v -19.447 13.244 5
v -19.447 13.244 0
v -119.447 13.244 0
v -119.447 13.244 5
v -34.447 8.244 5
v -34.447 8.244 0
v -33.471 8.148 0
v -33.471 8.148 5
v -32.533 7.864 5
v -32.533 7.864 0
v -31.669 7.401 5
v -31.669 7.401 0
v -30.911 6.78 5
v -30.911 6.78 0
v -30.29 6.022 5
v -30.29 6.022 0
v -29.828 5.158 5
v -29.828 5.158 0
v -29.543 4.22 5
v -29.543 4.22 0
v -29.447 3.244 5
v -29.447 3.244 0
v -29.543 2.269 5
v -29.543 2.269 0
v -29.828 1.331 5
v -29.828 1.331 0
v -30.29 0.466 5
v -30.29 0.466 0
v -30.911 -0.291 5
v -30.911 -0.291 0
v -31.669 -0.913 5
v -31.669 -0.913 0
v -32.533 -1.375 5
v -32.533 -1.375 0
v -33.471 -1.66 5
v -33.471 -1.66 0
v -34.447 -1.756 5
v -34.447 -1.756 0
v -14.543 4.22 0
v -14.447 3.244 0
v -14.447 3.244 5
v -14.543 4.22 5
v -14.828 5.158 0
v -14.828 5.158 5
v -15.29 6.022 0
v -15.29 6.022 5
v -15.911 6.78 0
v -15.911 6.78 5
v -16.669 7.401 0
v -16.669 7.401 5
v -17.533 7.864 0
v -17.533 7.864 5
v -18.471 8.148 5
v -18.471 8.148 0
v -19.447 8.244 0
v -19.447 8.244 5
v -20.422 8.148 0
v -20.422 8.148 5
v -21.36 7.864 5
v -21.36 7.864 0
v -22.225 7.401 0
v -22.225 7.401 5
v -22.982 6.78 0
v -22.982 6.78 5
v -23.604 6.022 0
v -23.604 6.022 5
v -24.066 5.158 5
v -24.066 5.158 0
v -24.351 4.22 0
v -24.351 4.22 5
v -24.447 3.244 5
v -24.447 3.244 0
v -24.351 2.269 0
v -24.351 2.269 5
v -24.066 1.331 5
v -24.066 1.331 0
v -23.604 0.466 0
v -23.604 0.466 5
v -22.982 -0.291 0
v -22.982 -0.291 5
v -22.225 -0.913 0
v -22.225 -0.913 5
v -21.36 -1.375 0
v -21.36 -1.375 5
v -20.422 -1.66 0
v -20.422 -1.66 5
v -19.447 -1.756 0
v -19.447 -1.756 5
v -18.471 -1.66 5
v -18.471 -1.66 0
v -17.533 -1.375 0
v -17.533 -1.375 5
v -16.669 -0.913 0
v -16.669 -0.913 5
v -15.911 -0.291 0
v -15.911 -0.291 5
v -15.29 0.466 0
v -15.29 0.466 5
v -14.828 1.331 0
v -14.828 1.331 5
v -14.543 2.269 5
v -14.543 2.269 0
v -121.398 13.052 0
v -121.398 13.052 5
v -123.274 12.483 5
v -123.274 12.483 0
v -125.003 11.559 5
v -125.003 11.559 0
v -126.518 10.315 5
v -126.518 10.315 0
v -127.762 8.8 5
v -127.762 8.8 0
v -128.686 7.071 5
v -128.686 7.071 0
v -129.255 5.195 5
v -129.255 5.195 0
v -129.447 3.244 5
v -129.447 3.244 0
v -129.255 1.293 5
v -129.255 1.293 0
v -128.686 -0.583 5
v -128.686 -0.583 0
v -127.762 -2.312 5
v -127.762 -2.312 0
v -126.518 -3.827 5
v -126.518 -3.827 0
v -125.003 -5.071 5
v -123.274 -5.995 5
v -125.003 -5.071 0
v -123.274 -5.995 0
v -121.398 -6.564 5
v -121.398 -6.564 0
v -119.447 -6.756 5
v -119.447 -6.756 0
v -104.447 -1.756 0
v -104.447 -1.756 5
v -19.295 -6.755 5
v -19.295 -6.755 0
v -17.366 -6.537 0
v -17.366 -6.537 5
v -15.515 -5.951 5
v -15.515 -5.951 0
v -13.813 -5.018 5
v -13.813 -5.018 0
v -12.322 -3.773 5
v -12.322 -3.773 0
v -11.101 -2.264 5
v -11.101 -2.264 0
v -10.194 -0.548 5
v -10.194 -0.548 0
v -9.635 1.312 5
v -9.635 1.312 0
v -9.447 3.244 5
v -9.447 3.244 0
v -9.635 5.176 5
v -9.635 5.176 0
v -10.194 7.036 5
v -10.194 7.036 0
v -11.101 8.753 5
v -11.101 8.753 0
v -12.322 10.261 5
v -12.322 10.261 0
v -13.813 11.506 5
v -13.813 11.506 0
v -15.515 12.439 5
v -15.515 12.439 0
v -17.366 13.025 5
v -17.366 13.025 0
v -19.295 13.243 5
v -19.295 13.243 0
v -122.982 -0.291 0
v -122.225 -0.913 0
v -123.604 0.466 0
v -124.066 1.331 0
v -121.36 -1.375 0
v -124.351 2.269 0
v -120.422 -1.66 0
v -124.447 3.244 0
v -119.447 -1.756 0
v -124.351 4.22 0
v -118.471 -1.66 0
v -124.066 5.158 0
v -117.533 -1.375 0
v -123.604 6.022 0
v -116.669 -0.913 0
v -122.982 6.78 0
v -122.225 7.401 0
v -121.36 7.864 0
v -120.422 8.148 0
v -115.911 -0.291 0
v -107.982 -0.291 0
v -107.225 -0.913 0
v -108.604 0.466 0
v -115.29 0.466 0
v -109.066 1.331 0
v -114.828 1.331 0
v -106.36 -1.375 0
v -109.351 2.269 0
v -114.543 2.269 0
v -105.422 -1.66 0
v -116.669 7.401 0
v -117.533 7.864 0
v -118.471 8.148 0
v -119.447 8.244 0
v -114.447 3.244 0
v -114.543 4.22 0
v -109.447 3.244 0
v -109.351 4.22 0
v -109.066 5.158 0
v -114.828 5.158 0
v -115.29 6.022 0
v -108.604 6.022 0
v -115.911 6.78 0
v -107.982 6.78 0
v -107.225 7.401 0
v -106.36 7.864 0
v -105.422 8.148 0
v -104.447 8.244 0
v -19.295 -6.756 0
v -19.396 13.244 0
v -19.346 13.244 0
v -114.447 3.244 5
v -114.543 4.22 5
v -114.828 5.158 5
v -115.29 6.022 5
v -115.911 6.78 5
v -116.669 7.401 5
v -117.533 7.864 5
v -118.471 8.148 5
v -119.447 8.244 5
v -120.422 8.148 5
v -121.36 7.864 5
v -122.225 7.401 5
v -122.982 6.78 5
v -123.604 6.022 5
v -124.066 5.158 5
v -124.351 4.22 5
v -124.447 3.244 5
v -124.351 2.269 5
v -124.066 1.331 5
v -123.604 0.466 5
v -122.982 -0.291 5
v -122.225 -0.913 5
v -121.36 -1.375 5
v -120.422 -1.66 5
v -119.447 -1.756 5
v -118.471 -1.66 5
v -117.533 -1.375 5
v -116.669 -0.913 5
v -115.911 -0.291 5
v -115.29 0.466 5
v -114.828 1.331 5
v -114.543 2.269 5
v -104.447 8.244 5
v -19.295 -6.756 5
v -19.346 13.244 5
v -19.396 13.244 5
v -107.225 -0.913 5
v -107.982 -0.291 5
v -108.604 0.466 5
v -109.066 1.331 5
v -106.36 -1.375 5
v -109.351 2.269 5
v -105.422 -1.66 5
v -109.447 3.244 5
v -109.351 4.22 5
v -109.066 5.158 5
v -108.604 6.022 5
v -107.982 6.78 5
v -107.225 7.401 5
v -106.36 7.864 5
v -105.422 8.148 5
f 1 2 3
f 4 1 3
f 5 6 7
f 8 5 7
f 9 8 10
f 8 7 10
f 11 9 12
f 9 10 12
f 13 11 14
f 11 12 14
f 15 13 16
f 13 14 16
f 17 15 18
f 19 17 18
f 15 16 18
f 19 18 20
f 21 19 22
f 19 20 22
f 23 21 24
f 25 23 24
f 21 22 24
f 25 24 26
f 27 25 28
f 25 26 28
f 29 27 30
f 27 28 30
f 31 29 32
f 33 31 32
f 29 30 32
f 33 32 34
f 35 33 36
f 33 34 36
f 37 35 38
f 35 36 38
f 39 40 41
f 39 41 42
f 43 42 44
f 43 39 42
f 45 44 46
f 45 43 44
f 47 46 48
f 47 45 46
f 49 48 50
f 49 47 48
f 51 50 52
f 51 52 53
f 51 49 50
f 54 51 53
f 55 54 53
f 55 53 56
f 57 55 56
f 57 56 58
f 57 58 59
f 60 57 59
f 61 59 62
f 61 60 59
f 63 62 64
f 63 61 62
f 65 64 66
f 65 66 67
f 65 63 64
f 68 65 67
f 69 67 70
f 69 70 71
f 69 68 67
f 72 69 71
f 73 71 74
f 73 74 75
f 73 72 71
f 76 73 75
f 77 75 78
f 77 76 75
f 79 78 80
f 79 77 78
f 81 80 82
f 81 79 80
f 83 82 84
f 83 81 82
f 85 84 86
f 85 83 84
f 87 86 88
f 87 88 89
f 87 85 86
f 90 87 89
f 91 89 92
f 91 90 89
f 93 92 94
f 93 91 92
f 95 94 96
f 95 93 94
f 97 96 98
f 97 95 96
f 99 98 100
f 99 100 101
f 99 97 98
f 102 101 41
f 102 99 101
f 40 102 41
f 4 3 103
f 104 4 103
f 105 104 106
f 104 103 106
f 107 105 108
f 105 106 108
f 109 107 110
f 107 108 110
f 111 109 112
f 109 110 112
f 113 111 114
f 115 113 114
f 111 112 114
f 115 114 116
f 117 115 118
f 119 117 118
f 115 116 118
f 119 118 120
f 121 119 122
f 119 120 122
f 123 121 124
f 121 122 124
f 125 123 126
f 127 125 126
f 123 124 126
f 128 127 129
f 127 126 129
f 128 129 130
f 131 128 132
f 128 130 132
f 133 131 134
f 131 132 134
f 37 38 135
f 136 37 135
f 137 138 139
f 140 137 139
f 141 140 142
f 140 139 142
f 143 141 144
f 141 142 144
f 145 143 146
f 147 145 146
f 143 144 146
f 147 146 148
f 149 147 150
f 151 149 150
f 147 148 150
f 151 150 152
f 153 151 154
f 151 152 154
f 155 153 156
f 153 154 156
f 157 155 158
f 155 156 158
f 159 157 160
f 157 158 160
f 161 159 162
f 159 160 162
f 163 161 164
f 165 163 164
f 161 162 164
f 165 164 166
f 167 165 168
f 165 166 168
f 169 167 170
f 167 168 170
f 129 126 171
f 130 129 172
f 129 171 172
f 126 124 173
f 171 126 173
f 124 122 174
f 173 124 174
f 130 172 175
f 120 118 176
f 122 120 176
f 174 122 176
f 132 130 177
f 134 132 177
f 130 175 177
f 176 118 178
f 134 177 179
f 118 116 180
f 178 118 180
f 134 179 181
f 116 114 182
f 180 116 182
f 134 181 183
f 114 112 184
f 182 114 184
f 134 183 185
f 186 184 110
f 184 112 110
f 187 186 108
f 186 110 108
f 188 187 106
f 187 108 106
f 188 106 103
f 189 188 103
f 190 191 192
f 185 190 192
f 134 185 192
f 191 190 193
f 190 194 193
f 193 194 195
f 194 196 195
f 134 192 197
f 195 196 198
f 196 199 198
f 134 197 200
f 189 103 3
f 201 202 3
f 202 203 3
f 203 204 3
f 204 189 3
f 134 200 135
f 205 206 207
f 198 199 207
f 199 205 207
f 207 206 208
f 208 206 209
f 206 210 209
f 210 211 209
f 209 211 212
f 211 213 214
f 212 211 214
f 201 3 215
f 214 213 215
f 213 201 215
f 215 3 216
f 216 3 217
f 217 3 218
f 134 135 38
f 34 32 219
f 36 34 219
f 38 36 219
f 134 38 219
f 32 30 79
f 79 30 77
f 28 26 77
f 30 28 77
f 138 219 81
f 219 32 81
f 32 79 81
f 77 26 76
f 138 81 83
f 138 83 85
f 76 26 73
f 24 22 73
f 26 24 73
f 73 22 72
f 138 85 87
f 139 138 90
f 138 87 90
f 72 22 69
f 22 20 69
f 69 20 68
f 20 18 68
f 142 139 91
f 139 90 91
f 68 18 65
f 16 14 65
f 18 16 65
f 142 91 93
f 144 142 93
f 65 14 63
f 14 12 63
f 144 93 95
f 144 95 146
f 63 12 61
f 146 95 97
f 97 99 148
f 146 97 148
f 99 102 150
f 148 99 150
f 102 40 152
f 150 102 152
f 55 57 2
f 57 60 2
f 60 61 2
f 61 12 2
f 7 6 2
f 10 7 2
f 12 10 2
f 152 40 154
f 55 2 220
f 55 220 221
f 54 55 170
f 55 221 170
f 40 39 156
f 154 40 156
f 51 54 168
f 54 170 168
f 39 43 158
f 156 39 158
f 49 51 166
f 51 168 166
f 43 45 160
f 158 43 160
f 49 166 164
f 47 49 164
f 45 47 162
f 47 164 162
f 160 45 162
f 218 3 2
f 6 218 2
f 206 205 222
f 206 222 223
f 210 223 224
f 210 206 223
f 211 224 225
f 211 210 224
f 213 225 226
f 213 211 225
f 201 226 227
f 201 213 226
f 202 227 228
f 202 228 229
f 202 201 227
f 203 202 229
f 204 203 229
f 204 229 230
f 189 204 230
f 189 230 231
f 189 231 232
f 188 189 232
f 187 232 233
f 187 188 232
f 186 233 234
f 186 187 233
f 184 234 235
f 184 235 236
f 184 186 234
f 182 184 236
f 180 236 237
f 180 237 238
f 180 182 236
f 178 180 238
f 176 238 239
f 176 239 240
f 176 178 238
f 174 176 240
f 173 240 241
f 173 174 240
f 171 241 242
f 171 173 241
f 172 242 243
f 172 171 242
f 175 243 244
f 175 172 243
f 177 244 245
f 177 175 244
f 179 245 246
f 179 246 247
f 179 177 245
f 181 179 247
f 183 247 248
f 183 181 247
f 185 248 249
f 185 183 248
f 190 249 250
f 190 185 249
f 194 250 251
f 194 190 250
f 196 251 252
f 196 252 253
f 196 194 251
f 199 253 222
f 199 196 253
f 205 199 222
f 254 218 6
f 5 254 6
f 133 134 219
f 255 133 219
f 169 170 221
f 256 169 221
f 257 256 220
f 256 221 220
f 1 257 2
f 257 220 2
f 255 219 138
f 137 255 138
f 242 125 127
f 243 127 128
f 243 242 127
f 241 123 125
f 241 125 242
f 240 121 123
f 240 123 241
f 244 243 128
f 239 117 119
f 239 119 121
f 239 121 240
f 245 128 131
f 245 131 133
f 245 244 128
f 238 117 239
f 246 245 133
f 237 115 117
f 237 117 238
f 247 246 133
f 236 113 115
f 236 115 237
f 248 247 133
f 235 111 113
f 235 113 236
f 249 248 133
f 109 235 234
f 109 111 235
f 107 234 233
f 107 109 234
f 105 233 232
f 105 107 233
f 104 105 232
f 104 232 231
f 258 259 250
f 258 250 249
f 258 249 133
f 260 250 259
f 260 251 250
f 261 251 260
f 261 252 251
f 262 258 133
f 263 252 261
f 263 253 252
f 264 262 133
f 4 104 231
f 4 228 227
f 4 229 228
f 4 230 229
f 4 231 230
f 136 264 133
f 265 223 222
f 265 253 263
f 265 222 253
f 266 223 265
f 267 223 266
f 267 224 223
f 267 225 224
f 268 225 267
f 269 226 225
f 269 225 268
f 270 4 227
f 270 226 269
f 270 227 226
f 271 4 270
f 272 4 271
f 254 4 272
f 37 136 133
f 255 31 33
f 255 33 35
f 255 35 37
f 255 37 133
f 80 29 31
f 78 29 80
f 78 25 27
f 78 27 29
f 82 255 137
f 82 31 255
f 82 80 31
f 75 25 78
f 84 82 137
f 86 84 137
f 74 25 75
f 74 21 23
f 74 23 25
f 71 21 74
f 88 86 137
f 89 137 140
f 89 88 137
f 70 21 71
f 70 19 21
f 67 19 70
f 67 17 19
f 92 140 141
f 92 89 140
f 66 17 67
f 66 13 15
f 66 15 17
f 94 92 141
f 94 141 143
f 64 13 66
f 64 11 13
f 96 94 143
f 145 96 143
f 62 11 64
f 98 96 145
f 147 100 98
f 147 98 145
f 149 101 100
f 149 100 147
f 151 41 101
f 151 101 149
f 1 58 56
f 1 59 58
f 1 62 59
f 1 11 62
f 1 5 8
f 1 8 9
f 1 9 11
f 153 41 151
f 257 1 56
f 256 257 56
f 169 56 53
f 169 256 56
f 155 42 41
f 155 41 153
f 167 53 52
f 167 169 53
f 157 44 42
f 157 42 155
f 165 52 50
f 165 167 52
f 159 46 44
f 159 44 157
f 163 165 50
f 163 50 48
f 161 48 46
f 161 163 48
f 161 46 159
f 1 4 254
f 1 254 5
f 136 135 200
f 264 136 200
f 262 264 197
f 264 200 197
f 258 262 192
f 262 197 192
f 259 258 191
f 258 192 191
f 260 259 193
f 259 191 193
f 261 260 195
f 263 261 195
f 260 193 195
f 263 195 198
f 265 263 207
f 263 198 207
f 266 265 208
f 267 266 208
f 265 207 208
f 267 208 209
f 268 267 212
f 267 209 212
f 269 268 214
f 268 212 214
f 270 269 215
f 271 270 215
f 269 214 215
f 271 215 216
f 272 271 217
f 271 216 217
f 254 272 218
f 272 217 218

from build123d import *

# Parameters (mm, degrees)
ESBO_O1_R                = 5
RESSALTO_EXTRUS_O1_DEPTH = 5


with BuildPart() as part:
    # Esboço1 → Ressalto-extrusão1 (new body)
    with BuildSketch(Plane.XY):
        with BuildLine():
            Line((-19.446898693, 13.244129565), (-119.446898693, 13.244129565))
            ThreePointArc((-119.446898693, 13.244129565), (-129.446898693, 3.244129565), (-119.446898693, -6.755870435))
            Line((-119.446898693, -6.755870435), (-19.295466425, -6.755870435))
            Line((-19.295466425, -6.755870435), (-19.295466425, -6.754723783))
            ThreePointArc((-19.295466425, -6.754723783), (-9.446898693, 3.244129565), (-19.295466425, 13.242982913))
            ThreePointArc((-19.295466425, 13.242982913), (-19.371180388, 13.243842898), (-19.446898693, 13.244129565))
        make_face()
        with Locations((-119.446898693, 3.244129565)):
            Circle(ESBO_O1_R, mode=Mode.SUBTRACT)
        with BuildLine():
            ThreePointArc((-104.446898693, -1.755870435), (-109.446898693, 3.244129565), (-104.446898693, 8.244129565))
            Line((-104.446898693, 8.244129565), (-34.446898693, 8.244129565))
            ThreePointArc((-34.446898693, 8.244129565), (-29.446898693, 3.244129565), (-34.446898693, -1.755870435))
            Line((-34.446898693, -1.755870435), (-104.446898693, -1.755870435))
        make_face(mode=Mode.SUBTRACT)
        with Locations((-19.446898693, 3.244129565)):
            Circle(ESBO_O1_R, mode=Mode.SUBTRACT)
    extrude(amount=RESSALTO_EXTRUS_O1_DEPTH)


solid = part.part
